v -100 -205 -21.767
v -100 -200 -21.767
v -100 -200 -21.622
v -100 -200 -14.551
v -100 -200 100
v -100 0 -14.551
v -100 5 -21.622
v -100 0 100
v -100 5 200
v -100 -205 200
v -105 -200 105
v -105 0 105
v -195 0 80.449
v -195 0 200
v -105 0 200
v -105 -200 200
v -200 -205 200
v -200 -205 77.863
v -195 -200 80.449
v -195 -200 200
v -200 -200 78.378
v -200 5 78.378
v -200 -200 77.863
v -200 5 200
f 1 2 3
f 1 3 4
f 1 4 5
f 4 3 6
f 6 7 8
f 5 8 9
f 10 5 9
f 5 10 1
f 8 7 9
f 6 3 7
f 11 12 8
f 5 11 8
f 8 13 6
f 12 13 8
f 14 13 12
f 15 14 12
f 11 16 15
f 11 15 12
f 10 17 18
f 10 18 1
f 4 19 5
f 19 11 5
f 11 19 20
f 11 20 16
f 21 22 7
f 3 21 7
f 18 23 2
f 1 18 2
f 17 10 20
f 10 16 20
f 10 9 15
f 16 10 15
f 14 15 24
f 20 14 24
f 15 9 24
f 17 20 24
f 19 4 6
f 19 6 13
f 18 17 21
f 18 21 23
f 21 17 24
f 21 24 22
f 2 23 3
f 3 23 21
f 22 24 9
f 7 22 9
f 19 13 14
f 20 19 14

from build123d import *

# Parameters (mm, degrees)
F1_DEPTH = 5
F2_DEPTH = 200
F5_DEPTH = 5


with BuildPart() as f1:
    # F0 (on Front) → F1 (new body)
    with BuildSketch(Plane.XZ):
        Polygon((-100, -14.5512985522), (-100, 0), (-100, 100), (-105, 105), (-105, 200), (-195, 200), (-195, 80.4487014478), align=None)
        Polygon((-100, -21.6223663641), (-100, -14.5512985522), (-195, 80.4487014478), (-195, 200), (-200, 200), (-200, 78.3776336359), align=None)
        Polygon((-105, 105), (-100, 100), (-100, 200), (-105, 200), align=None)
    extrude(amount=-F1_DEPTH)

    # F0 (on Front) → F2 (join)
    with BuildSketch(Plane.XZ):
        Polygon((-100, -21.6223663641), (-100, -14.5512985522), (-195, 80.4487014478), (-195, 200), (-200, 200), (-200, 78.3776336359), align=None)
        Polygon((-105, 105), (-100, 100), (-100, 200), (-105, 200), align=None)
    extrude(amount=F2_DEPTH)

    # F4 (on offset) → F5 (join)
    with BuildSketch(Plane.XZ.offset(200)):
        Polygon((-100, -21.7671551462), (-100, 200), (-200, 200), (-200, 77.8633803129), align=None)
    extrude(amount=F5_DEPTH)


solid = f1.part
